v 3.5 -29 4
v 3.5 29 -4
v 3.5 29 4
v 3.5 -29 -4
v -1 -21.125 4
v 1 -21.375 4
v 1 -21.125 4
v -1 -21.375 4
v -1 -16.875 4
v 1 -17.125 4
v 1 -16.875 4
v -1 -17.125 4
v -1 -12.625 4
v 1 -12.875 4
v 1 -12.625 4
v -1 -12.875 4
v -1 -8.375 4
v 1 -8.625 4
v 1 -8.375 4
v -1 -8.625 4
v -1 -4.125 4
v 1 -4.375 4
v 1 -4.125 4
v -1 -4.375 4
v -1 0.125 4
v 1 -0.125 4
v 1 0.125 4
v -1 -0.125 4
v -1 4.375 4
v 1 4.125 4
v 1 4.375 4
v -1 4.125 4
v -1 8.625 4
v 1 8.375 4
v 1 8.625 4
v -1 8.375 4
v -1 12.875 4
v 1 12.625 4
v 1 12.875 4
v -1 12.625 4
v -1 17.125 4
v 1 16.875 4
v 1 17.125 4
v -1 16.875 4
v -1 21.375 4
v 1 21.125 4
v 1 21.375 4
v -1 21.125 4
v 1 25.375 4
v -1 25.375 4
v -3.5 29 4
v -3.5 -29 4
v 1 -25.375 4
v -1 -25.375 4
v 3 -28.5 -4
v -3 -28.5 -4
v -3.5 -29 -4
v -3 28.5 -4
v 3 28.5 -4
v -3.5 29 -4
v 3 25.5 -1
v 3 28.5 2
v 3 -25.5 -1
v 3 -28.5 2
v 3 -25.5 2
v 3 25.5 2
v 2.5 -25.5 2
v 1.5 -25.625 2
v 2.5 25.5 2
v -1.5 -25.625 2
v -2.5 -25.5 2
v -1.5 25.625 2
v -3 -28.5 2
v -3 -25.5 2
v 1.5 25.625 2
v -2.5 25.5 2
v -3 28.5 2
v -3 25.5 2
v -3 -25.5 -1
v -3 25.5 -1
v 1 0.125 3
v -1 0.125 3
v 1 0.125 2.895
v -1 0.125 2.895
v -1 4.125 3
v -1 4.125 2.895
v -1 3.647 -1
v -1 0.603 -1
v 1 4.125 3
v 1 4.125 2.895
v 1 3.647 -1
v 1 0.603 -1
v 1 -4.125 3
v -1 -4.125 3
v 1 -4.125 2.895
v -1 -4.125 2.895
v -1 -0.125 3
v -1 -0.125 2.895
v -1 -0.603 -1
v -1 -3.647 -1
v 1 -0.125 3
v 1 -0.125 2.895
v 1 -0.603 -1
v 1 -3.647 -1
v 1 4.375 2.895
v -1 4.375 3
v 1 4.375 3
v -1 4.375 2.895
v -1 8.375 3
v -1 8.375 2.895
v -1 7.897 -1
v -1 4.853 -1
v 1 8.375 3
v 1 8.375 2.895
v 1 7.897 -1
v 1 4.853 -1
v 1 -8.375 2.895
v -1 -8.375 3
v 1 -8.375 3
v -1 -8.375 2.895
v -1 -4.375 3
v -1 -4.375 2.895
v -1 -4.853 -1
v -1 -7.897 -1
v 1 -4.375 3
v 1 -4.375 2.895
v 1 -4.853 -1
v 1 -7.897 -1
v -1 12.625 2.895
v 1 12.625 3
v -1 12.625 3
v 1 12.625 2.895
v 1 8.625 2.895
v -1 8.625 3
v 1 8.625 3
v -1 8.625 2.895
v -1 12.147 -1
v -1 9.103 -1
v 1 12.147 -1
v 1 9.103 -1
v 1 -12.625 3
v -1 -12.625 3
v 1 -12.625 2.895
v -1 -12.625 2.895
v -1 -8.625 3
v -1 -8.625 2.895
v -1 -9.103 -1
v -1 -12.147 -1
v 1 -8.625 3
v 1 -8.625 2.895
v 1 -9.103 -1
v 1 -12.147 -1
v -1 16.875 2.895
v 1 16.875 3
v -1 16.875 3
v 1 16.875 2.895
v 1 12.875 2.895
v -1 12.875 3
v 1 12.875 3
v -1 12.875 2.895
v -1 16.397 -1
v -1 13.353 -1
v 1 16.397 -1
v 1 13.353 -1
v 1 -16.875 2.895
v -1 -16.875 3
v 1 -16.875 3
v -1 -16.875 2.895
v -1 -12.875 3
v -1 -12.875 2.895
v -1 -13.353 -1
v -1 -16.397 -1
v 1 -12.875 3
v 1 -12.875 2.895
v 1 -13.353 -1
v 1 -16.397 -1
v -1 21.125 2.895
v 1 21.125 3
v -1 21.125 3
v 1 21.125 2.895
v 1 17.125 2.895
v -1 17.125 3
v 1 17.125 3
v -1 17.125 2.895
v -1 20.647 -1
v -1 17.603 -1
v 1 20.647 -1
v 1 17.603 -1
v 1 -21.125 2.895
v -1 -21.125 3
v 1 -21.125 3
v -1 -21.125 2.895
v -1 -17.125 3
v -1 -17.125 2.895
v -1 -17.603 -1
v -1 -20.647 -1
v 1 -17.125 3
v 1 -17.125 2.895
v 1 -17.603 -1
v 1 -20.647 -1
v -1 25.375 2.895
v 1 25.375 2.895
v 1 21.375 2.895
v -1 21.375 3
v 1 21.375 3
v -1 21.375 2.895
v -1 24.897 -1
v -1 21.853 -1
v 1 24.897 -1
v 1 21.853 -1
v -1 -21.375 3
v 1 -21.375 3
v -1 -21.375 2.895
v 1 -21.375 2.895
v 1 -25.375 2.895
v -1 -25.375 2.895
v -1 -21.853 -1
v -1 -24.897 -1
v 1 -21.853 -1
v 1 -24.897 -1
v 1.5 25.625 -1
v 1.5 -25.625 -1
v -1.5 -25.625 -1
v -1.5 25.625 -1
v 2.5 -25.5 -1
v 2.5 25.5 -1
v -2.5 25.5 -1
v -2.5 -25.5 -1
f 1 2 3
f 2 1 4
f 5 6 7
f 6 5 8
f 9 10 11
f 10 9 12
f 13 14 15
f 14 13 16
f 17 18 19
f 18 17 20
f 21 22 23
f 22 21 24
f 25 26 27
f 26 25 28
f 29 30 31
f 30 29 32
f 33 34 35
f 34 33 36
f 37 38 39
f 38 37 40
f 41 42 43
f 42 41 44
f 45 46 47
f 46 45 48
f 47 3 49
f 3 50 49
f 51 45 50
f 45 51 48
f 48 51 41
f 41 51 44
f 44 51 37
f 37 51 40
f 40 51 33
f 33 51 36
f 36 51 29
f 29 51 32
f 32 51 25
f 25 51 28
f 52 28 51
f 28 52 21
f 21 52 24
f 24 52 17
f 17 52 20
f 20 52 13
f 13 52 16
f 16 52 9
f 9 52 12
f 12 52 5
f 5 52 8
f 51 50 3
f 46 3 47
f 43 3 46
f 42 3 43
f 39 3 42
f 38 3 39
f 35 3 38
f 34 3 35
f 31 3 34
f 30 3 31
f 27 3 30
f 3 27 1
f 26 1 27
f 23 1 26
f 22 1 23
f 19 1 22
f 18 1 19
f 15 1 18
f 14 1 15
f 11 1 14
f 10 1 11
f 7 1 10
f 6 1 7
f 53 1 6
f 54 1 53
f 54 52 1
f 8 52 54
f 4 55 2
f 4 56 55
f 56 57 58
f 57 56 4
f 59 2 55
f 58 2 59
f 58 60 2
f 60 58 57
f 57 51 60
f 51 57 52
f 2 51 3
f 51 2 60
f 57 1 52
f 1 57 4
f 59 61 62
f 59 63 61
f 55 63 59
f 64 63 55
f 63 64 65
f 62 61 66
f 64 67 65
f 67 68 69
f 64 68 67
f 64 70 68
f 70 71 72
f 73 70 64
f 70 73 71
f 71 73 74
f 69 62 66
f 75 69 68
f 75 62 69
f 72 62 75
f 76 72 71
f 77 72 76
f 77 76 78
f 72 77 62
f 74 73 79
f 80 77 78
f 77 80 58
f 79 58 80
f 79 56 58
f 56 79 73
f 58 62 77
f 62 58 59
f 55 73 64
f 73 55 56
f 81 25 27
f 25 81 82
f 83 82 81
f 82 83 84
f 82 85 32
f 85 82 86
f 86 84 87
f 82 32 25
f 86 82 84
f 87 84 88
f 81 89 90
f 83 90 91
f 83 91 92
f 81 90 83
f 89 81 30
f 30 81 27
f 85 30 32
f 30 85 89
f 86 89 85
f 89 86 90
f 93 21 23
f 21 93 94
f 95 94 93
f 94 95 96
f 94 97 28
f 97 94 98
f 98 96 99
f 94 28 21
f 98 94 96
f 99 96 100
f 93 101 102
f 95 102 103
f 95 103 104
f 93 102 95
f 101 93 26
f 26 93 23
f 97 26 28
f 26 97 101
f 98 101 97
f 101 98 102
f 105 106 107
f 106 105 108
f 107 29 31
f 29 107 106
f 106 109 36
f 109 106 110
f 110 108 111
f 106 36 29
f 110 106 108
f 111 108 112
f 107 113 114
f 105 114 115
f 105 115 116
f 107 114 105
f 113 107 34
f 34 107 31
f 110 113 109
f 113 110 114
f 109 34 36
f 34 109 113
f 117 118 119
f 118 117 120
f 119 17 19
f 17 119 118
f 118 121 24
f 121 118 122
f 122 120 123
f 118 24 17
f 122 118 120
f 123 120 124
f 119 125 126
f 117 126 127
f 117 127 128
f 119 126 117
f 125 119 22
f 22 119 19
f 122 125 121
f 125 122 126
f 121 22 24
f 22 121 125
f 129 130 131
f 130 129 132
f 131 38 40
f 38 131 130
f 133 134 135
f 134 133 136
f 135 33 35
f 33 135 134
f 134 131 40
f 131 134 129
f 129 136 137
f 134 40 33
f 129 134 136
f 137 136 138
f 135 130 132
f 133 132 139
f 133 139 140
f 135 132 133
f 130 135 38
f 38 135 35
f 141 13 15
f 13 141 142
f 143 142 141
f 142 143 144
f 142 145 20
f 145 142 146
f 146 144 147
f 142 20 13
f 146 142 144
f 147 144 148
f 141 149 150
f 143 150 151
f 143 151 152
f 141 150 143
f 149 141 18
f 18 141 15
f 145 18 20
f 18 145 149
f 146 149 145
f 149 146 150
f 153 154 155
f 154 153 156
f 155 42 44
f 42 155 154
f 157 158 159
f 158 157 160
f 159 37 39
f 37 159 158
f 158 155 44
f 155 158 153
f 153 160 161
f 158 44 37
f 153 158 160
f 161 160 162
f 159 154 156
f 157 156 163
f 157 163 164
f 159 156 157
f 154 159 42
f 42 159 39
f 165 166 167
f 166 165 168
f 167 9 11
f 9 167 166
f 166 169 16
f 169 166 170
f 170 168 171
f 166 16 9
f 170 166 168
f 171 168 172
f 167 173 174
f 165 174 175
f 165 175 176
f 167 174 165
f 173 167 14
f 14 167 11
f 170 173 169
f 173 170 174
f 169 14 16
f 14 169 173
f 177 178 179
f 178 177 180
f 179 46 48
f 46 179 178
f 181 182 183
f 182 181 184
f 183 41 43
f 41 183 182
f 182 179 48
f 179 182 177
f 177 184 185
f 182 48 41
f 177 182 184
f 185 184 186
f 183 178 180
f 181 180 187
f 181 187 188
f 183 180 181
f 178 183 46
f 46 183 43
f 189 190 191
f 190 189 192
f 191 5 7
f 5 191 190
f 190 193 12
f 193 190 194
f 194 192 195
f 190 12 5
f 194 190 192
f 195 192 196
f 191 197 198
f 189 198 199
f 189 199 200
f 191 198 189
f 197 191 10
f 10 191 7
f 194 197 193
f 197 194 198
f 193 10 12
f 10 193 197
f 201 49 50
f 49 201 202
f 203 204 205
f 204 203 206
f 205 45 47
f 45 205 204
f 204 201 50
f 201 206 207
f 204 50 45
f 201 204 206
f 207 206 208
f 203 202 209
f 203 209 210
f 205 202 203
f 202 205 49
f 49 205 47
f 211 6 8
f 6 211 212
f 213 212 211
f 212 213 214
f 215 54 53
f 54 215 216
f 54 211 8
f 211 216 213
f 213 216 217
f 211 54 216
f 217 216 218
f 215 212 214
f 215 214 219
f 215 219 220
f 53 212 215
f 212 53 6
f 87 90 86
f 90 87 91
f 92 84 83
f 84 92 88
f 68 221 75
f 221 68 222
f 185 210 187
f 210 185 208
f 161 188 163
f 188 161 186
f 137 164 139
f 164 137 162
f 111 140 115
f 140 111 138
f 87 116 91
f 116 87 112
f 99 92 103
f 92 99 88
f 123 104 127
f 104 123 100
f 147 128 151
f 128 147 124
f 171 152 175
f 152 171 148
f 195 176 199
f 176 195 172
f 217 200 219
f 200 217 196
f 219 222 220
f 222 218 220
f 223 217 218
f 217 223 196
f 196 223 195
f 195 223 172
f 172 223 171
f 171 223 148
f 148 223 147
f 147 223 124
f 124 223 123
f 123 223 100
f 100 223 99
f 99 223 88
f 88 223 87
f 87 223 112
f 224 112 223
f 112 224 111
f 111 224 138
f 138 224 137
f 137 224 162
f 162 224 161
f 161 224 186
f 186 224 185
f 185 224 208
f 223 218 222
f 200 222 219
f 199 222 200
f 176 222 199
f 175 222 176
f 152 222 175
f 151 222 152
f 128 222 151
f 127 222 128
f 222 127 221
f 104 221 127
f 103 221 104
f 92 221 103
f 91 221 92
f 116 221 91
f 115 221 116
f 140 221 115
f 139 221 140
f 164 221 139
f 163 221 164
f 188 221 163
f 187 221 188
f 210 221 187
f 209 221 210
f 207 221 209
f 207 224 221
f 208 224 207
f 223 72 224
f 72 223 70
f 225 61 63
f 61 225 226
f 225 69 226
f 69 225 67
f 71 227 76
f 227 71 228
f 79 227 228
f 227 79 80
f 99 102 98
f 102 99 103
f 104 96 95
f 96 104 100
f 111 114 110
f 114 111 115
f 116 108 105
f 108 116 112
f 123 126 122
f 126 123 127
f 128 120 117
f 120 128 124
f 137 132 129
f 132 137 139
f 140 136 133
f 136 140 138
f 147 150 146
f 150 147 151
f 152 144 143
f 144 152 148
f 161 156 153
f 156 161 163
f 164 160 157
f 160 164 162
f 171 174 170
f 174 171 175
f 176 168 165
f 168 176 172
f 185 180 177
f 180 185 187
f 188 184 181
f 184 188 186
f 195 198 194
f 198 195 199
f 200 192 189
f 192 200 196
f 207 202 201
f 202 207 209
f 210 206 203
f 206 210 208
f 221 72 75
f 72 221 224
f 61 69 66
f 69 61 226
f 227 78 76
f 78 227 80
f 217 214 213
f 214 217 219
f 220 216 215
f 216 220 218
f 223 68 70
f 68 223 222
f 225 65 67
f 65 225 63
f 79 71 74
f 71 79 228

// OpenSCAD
$fn=50;
$t=true;        //Abbreviation
$wth=1;         //Wall Thickness
$l=58;          //Length
$w=7;           //Width
$h=8;           //Height
$ow=4;          //LED Opening Width
$oiw=3.5;       //LED Opening Inside Width
$ol=2;          //LED Opening length
$os=.25;        //LED Opening Spacing
$ols=$ow+$os;   //Distance per LED
$olso=$ols/2;   //Offset for Center
$od=4;          //LED Opening Depth

module ledopening() {
    rotate([0,0,90]) cube([$ow,$ol,$wth*4], center=$t);
}

module ledconduit() {
    difference() {
        cube([$ol+1, $ow+$os*2, $h/2], center=$t);
        difference() {
            cube([$ol, $ow, $h/2+.1], center=$t);
            translate([0,$ol+.26,-.09]) rotate([-7,0,0]) cube([$ol, 1, $h/2+.1], center=$t);
            translate([0,-$ol-.26,-.09]) rotate([7,0,0]) cube([$ol, 1, $h/2+.1], center=$t);
        }
    }
    translate([($w/2)-$wth+.25,0,0]) cube([.5,$ols,$h/2], center=$t);
    translate([-($w/2)+$wth-.25,0,0]) cube([.5,$ols,$h/2], center=$t);
}

difference() {
    cube([$w,$l,$h], center=$t);
    translate([0,0,-$wth*2]) cube([$w-$wth,$l-$wth,$h], center=$t);
    translate([0,$olso,$h/2]) ledopening();         //LED #6
    translate([0,-$olso,$h/2]) ledopening();        //LED #7
    translate([0,$olso+$ols,$h/2]) ledopening();    //LED #5
    translate([0,-$olso-$ols,$h/2]) ledopening();   //LED #8
    translate([0,$olso+$ols*2,$h/2]) ledopening();  //LED #4
    translate([0,-$olso-$ols*2,$h/2]) ledopening(); //LED #9
    translate([0,$olso+$ols*3,$h/2]) ledopening();  //LED #3
    translate([0,-$olso-$ols*3,$h/2]) ledopening(); //LED #10
    translate([0,$olso+$ols*4,$h/2]) ledopening();  //LED #2
    translate([0,-$olso-$ols*4,$h/2]) ledopening(); //LED #11
    translate([0,$olso+$ols*5,$h/2]) ledopening();  //LED #1
    translate([0,-$olso-$ols*5,$h/2]) ledopening(); //LED #12
}
//translate([0,$olso,$h]) ledconduit();
translate([0,$olso,1]) ledconduit();                //LED Conduit #6
translate([0,-$olso,1]) ledconduit();               //LED Conduit #7
translate([0,$olso+$ols,1]) ledconduit();           //LED Conduit #5
translate([0,-$olso-$ols,1]) ledconduit();          //LED Conduit #8
translate([0,$olso+$ols*2,1]) ledconduit();         //LED Conduit #4
translate([0,-$olso-$ols*2,1]) ledconduit();        //LED Conduit #9
translate([0,$olso+$ols*3,1]) ledconduit();         //LED Conduit #3
translate([0,-$olso-$ols*3,1]) ledconduit();        //LED Conduit #10
translate([0,$olso+$ols*4,1]) ledconduit();         //LED Conduit #2
translate([0,-$olso-$ols*4,1]) ledconduit();        //LED Conduit #11
translate([0,$olso+$ols*5,1]) ledconduit();         //LED Conduit #1
translate([0,-$olso-$ols*5,1]) ledconduit();        //LED Conduit #12
